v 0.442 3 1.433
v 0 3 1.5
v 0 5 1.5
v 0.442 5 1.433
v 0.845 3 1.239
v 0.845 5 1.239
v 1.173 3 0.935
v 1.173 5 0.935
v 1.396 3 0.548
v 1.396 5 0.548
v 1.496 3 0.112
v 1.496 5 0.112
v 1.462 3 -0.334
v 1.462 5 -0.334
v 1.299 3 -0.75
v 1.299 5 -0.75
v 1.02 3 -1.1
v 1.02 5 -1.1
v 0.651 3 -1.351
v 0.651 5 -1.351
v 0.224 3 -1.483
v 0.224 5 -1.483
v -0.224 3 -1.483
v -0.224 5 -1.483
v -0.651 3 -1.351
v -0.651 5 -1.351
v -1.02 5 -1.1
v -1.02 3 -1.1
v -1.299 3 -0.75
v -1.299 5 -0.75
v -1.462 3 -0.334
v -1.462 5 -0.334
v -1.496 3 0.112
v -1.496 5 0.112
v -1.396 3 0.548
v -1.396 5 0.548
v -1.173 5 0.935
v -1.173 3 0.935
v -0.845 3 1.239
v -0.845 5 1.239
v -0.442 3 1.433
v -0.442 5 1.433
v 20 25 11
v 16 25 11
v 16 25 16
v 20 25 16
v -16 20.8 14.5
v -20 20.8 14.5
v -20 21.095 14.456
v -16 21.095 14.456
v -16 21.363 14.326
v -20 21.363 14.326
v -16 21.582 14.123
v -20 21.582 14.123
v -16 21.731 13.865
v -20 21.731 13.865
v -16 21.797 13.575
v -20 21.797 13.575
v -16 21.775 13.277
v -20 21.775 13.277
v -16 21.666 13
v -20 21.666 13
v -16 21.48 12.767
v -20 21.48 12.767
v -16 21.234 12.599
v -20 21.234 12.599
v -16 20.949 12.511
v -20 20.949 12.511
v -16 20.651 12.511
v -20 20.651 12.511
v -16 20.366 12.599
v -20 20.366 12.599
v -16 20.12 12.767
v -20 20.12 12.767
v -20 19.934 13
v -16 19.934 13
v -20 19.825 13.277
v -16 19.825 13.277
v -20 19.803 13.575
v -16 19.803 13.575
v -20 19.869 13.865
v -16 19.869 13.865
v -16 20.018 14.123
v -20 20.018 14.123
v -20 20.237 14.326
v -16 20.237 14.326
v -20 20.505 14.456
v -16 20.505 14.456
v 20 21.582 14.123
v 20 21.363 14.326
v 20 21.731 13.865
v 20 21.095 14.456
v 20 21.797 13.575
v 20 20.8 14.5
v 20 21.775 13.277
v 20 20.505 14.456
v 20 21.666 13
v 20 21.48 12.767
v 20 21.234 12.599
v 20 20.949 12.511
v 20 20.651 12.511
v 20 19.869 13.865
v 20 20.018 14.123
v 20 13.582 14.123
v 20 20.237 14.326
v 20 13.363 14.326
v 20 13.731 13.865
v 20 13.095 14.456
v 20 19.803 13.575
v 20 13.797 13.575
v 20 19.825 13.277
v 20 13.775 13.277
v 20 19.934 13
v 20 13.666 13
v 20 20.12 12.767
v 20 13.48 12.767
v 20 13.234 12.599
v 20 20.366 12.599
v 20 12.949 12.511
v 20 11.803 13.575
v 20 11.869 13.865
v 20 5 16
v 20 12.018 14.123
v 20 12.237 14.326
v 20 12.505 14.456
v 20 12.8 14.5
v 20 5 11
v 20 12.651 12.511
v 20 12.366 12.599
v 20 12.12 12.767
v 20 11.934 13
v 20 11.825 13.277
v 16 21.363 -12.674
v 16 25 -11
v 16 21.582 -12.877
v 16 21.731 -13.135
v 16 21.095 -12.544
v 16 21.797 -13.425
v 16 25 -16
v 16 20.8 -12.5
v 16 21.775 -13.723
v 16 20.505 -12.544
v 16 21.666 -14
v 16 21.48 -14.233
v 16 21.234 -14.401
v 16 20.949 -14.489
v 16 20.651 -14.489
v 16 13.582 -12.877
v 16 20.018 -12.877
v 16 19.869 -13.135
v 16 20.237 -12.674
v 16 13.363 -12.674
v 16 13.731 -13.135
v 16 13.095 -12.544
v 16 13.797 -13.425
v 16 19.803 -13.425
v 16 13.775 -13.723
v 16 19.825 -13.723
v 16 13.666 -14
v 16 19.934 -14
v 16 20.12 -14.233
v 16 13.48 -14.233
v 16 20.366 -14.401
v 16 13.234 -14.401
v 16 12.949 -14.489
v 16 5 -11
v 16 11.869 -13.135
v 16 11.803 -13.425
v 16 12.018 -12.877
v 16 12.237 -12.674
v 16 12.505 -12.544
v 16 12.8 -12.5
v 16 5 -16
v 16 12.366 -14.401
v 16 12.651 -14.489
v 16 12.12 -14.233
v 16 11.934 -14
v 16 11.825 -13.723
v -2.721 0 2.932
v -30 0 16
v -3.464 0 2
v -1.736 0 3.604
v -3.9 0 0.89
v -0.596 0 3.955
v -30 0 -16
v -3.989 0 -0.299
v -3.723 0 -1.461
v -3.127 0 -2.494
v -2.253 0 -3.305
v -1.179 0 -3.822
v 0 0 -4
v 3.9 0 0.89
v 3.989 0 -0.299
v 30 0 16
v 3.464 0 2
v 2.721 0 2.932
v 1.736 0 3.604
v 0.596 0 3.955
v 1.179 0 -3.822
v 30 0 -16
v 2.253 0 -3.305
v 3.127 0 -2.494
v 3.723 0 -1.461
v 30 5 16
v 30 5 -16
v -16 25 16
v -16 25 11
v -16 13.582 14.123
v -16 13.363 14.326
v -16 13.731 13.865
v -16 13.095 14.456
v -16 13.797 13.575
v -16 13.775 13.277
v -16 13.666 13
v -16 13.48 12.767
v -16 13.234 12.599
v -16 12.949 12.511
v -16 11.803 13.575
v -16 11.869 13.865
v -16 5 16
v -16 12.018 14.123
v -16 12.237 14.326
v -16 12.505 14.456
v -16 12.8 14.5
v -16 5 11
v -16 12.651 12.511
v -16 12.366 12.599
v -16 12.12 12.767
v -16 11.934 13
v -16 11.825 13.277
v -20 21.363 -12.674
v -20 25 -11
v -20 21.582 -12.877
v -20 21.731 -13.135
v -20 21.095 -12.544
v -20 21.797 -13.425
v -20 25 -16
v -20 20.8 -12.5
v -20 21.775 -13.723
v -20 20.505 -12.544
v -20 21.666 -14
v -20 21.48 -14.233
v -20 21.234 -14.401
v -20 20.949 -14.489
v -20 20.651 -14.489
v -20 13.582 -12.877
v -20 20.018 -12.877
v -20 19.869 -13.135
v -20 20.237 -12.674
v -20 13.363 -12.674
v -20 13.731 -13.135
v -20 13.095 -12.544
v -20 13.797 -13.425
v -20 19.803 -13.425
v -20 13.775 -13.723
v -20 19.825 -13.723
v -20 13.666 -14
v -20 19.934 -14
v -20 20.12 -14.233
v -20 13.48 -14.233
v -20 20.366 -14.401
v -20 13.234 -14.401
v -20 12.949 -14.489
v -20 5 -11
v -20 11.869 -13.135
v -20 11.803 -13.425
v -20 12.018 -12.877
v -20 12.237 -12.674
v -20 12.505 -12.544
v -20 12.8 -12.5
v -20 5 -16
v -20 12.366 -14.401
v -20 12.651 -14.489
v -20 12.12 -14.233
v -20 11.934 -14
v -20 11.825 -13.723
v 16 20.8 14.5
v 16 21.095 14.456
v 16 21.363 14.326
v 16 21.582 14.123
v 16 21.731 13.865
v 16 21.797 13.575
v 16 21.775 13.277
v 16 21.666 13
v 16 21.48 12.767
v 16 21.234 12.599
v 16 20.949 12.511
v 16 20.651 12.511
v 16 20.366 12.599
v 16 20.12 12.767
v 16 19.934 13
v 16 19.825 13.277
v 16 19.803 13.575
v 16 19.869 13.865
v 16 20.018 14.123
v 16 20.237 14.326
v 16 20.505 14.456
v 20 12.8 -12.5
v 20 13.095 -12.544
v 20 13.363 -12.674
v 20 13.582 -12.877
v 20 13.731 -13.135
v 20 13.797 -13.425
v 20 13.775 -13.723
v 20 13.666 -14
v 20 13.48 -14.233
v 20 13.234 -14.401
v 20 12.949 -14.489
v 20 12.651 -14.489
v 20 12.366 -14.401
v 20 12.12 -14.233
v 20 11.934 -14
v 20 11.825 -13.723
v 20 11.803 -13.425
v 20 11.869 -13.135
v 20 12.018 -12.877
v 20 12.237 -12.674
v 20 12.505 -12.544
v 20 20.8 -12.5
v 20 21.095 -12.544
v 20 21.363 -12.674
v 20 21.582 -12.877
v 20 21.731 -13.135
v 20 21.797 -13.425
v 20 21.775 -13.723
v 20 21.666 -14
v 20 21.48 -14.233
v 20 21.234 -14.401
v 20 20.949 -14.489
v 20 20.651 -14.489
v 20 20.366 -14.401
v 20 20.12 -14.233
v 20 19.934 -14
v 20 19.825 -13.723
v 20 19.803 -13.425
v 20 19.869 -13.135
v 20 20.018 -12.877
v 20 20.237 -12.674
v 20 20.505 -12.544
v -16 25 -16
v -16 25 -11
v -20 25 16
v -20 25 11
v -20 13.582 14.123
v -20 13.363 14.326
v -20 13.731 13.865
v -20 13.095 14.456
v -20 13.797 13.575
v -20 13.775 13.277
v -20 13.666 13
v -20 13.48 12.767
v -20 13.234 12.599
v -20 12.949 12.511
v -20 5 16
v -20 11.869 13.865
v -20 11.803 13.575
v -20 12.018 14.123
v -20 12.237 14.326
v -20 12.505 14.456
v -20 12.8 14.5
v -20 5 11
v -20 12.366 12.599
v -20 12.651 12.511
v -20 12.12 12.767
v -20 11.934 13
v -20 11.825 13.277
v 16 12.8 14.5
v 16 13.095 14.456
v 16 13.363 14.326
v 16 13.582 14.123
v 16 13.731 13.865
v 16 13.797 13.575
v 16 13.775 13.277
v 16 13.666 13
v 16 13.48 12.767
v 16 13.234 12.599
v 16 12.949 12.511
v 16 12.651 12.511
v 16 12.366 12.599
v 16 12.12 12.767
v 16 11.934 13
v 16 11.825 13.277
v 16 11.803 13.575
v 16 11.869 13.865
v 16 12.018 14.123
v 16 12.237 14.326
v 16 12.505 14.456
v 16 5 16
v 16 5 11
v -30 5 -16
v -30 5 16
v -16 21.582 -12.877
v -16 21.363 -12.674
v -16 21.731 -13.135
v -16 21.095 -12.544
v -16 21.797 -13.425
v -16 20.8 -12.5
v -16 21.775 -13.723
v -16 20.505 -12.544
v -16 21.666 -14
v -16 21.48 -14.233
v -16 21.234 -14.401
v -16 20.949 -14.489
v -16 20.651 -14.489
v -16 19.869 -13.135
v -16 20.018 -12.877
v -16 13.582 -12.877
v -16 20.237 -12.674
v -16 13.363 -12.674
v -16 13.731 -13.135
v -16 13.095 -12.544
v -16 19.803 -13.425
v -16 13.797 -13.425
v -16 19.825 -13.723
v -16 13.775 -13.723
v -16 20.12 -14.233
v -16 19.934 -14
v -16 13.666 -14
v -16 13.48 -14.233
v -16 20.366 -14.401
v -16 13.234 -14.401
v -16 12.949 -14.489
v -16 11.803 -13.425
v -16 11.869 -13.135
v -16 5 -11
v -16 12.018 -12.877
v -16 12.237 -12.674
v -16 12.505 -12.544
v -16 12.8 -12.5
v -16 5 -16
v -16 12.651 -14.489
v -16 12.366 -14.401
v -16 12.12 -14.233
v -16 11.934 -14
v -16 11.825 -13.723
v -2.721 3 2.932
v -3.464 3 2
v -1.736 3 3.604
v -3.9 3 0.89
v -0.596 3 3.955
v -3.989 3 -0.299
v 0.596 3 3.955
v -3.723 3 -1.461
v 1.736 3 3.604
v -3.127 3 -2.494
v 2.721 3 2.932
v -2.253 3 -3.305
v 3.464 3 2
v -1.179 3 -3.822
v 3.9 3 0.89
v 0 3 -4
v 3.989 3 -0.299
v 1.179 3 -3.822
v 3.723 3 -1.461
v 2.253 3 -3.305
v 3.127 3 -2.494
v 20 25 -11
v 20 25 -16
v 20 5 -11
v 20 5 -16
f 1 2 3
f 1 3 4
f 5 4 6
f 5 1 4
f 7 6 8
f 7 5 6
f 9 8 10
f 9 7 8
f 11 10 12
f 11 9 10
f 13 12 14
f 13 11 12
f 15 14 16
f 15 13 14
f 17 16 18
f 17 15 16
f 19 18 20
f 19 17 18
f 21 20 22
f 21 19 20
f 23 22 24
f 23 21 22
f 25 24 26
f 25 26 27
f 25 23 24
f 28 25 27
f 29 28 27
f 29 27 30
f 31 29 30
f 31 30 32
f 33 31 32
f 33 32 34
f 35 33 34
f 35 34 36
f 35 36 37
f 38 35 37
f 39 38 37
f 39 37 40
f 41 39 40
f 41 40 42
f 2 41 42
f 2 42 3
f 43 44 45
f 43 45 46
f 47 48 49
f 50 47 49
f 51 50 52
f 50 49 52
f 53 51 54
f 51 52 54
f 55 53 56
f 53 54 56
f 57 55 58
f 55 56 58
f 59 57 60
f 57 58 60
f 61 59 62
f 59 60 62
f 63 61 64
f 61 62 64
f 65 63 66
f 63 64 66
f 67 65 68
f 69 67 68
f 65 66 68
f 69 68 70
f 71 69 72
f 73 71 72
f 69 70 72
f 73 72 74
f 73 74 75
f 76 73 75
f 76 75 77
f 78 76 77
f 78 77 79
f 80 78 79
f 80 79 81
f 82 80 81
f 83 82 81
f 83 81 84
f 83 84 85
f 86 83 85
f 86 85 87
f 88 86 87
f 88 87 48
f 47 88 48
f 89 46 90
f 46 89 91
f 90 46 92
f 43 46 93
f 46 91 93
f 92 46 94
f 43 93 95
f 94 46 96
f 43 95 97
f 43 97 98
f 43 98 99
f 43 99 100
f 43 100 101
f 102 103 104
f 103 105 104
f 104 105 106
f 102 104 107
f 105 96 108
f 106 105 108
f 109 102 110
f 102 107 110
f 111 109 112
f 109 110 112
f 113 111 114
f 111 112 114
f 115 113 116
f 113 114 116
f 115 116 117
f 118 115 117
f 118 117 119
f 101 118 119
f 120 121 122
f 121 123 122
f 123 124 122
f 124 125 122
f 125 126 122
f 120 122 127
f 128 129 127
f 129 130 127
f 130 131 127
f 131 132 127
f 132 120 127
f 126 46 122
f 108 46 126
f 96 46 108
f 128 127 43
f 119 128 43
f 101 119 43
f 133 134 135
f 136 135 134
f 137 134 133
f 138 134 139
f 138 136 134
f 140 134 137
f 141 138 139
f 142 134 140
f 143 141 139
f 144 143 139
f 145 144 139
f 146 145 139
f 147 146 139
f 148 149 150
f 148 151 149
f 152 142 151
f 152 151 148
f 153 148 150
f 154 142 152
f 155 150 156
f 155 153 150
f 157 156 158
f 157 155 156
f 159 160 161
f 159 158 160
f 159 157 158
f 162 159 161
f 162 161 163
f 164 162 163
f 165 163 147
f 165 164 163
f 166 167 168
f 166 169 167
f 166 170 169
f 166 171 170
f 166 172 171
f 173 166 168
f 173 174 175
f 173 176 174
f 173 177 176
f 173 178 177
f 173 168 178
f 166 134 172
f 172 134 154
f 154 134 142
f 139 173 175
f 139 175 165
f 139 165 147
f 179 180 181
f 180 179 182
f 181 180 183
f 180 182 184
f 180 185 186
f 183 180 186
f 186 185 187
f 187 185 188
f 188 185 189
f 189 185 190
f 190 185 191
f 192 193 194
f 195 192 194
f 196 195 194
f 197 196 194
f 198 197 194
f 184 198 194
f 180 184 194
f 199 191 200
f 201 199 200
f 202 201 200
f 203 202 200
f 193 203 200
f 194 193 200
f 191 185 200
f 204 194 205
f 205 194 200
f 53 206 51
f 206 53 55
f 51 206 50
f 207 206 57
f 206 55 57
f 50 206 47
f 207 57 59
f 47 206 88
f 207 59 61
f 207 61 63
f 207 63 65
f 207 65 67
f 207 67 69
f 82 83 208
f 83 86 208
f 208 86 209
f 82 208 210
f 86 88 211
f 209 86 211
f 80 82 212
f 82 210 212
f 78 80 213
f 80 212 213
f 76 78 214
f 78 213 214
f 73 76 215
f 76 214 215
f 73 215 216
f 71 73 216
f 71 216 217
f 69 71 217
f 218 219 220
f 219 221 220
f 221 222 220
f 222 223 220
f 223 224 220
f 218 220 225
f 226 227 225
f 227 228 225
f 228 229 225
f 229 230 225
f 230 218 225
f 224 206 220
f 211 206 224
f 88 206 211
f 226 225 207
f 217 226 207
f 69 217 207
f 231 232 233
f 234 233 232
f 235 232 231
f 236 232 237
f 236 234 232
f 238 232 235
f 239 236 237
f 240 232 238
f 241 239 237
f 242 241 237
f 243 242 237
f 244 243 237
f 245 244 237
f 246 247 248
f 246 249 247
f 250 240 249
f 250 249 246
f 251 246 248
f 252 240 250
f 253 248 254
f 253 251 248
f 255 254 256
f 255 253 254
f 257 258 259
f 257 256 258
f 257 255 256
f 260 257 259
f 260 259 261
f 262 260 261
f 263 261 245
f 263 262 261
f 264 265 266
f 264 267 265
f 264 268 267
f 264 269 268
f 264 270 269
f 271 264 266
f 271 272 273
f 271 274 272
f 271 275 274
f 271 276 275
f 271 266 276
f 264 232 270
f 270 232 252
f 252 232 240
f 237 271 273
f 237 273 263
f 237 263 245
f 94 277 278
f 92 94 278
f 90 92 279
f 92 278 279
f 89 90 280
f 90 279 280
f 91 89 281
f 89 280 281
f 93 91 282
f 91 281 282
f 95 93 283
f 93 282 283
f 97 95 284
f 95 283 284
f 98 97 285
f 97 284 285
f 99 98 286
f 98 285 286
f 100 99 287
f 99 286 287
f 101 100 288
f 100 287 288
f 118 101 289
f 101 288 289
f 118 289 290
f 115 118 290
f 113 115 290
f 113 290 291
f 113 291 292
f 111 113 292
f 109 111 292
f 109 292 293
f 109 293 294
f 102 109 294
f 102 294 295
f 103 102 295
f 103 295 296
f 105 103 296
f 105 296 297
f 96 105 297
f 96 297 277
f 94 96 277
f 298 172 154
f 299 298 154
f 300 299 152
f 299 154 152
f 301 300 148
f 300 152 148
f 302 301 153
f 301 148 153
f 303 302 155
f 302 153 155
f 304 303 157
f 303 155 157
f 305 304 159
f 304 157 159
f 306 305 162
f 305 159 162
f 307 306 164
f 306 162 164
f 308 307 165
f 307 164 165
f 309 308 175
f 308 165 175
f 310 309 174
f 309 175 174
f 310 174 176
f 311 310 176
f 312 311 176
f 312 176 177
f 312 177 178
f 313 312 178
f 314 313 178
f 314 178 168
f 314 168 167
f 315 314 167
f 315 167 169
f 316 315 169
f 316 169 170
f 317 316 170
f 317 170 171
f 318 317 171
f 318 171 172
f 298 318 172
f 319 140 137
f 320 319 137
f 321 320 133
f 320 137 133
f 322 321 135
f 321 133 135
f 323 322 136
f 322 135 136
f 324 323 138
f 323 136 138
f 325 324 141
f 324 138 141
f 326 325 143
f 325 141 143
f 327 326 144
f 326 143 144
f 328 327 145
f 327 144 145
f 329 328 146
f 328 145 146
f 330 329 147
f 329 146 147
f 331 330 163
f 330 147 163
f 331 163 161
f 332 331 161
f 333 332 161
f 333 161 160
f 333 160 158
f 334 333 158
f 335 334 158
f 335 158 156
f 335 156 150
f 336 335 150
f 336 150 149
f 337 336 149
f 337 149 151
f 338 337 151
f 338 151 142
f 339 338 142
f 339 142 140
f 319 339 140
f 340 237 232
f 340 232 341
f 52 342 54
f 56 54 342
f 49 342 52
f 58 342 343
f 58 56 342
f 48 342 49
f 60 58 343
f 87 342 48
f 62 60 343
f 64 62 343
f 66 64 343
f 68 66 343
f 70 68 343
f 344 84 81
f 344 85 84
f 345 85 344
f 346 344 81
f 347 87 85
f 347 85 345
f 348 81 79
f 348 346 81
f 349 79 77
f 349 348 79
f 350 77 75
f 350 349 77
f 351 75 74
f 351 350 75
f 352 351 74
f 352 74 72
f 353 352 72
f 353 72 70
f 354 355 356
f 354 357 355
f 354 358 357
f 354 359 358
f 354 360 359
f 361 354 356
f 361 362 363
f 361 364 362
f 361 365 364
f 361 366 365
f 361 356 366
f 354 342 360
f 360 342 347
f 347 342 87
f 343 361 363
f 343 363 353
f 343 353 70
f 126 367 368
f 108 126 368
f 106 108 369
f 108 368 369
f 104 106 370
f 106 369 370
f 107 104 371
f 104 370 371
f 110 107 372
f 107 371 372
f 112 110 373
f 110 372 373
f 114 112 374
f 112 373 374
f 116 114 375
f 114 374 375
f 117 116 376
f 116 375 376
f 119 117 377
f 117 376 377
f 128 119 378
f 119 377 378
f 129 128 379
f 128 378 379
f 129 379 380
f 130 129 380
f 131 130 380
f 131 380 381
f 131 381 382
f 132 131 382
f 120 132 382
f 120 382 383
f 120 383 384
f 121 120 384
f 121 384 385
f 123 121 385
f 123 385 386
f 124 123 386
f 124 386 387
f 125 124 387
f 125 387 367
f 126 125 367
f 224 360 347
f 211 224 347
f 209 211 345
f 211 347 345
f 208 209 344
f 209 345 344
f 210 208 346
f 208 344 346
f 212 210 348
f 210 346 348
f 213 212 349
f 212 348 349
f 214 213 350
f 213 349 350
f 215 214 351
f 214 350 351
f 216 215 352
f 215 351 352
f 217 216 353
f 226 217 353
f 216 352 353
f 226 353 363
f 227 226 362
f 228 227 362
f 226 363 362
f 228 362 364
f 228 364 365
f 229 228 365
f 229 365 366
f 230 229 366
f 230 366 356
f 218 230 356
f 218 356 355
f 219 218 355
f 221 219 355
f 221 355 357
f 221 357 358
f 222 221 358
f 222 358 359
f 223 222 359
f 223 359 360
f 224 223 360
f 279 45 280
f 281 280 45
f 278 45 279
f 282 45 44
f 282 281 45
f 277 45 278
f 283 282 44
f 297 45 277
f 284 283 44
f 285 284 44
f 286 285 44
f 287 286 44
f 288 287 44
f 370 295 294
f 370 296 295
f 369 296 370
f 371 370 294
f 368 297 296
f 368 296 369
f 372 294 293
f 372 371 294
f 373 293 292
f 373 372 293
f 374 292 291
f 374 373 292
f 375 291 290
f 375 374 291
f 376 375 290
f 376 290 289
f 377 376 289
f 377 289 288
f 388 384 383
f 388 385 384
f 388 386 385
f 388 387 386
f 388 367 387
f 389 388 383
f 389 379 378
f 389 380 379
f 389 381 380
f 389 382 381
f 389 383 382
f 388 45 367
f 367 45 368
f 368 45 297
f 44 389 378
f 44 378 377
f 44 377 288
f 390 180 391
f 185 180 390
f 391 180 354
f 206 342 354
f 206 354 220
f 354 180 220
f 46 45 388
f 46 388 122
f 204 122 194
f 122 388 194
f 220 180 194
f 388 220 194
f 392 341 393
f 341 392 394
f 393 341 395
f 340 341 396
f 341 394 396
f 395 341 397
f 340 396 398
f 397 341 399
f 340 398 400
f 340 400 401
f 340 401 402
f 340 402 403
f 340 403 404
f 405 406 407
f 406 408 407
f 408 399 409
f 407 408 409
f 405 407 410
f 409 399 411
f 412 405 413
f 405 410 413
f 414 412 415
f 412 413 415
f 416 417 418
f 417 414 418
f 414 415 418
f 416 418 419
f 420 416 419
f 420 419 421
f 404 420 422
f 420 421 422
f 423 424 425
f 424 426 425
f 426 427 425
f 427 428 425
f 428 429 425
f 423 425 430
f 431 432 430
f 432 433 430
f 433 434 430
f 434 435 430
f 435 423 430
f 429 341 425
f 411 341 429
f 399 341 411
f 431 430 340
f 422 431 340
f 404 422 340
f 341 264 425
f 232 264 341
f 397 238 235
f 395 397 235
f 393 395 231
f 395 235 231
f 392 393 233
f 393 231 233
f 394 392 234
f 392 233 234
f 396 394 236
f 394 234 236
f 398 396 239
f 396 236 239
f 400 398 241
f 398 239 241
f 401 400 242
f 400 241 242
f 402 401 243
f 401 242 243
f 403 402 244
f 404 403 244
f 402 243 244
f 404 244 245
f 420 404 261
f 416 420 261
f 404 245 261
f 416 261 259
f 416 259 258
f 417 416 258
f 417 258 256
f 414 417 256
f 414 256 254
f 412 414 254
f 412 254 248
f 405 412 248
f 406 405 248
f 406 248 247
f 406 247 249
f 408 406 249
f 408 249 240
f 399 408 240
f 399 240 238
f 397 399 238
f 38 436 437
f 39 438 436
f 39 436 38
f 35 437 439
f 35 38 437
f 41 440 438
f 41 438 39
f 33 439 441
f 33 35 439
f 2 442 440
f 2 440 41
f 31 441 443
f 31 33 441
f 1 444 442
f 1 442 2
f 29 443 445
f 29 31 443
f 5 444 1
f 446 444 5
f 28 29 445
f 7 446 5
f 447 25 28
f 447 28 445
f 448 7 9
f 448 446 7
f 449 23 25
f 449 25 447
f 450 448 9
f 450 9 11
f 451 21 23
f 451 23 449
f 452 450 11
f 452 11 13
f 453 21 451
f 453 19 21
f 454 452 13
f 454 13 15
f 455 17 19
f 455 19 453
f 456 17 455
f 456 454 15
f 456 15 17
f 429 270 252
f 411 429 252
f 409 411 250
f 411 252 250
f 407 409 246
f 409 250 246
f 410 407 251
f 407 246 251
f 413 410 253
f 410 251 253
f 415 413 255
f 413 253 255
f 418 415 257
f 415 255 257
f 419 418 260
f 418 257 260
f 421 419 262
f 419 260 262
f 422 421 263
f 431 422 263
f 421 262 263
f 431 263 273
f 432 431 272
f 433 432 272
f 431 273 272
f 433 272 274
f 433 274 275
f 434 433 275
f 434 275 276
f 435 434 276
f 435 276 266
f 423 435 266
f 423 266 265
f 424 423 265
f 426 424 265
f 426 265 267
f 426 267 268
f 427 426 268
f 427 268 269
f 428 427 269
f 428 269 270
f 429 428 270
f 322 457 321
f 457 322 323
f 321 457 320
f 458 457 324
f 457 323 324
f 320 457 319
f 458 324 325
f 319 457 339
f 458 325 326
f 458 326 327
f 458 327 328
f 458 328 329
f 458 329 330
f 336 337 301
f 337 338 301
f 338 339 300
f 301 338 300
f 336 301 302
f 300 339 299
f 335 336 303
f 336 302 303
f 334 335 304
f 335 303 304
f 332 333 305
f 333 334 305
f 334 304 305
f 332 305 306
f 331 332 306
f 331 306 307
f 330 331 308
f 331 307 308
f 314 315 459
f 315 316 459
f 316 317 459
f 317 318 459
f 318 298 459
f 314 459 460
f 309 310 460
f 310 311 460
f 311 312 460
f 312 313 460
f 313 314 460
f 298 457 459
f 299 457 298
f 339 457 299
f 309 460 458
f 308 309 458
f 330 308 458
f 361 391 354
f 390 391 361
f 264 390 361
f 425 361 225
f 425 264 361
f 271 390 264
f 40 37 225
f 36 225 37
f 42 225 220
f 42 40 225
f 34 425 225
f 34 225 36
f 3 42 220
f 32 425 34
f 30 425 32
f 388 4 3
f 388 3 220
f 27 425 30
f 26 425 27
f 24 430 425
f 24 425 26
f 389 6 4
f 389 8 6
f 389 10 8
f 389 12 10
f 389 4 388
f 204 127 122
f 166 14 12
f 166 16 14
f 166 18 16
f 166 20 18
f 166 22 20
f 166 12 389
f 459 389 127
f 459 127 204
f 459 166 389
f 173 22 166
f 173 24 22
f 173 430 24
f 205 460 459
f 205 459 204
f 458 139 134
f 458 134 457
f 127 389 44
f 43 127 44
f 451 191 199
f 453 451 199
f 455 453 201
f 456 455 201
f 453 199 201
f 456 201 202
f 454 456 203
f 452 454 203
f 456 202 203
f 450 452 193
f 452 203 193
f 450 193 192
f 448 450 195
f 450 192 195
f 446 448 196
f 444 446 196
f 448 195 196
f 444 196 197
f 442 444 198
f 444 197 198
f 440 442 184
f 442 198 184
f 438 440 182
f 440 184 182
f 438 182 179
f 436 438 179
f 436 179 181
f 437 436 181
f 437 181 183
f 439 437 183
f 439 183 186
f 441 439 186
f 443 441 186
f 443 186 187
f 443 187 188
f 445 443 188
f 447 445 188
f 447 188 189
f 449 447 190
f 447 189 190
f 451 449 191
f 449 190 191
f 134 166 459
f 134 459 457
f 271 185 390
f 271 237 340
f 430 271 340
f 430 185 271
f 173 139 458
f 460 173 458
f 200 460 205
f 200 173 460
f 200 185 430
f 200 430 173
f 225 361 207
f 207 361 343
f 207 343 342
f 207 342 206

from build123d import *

# Parameters (mm, degrees)
SKETCH1_W           = 60
SKETCH1_H           = 32
SKETCH1_R           = 1.5
BOSS_EXTRUDE1_DEPTH = 5
SKETCH2_R           = 4
CUT_EXTRUDE1_DEPTH  = 3
SKETCH3_W           = 4
SKETCH3_H           = 32
BOSS_EXTRUDE2_DEPTH = 20
SKETCH4_R           = 1
SKETCH4_W           = 22
SKETCH4_H           = 20
CUT_EXTRUDE2_DEPTH  = 59.14636704


with BuildPart() as part:
    # Sketch1 → Boss-Extrude1 (new body)
    with BuildSketch(Plane(origin=(0, 0, 0), x_dir=(1, 0, 0), z_dir=(0, 1, 0))):
        Rectangle(SKETCH1_W, SKETCH1_H)
        with Locations(Location((0, 0, 0), (0, 0, 270))):
            Circle(SKETCH1_R, mode=Mode.SUBTRACT)
    extrude(amount=BOSS_EXTRUDE1_DEPTH)

    # Sketch2 → Cut-Extrude1 (cut)
    with BuildSketch(Plane.XZ):
        with Locations(Location((0, 0, 0), (0, 0, 270))):
            Circle(SKETCH2_R)
    extrude(amount=-CUT_EXTRUDE1_DEPTH, mode=Mode.SUBTRACT)

    # Sketch3 → Boss-Extrude2 (add)
    with BuildSketch(Plane(origin=(0, 5, 0), x_dir=(1, 0, 0), z_dir=(0, 1, 0))):
        with Locations((-18, 0)):
            Rectangle(SKETCH3_W, SKETCH3_H)
        with Locations((18, 0)):
            Rectangle(SKETCH3_W, SKETCH3_H)
    extrude(amount=BOSS_EXTRUDE2_DEPTH)

    # Sketch4 → Cut-Extrude2 (cut, through all)
    with BuildSketch(Plane.ZY.offset(20)):
        with Locations((-13.5, 20.8)):
            Circle(SKETCH4_R)
        with Locations((-13.5, 12.8)):
            Circle(SKETCH4_R)
        with Locations((13.5, 20.8)):
            Circle(SKETCH4_R)
        with Locations((13.5, 12.8)):
            Circle(SKETCH4_R)
        with Locations((0, 15)):
            Rectangle(SKETCH4_W, SKETCH4_H)
    extrude(amount=-CUT_EXTRUDE2_DEPTH, mode=Mode.SUBTRACT)


solid = part.part
